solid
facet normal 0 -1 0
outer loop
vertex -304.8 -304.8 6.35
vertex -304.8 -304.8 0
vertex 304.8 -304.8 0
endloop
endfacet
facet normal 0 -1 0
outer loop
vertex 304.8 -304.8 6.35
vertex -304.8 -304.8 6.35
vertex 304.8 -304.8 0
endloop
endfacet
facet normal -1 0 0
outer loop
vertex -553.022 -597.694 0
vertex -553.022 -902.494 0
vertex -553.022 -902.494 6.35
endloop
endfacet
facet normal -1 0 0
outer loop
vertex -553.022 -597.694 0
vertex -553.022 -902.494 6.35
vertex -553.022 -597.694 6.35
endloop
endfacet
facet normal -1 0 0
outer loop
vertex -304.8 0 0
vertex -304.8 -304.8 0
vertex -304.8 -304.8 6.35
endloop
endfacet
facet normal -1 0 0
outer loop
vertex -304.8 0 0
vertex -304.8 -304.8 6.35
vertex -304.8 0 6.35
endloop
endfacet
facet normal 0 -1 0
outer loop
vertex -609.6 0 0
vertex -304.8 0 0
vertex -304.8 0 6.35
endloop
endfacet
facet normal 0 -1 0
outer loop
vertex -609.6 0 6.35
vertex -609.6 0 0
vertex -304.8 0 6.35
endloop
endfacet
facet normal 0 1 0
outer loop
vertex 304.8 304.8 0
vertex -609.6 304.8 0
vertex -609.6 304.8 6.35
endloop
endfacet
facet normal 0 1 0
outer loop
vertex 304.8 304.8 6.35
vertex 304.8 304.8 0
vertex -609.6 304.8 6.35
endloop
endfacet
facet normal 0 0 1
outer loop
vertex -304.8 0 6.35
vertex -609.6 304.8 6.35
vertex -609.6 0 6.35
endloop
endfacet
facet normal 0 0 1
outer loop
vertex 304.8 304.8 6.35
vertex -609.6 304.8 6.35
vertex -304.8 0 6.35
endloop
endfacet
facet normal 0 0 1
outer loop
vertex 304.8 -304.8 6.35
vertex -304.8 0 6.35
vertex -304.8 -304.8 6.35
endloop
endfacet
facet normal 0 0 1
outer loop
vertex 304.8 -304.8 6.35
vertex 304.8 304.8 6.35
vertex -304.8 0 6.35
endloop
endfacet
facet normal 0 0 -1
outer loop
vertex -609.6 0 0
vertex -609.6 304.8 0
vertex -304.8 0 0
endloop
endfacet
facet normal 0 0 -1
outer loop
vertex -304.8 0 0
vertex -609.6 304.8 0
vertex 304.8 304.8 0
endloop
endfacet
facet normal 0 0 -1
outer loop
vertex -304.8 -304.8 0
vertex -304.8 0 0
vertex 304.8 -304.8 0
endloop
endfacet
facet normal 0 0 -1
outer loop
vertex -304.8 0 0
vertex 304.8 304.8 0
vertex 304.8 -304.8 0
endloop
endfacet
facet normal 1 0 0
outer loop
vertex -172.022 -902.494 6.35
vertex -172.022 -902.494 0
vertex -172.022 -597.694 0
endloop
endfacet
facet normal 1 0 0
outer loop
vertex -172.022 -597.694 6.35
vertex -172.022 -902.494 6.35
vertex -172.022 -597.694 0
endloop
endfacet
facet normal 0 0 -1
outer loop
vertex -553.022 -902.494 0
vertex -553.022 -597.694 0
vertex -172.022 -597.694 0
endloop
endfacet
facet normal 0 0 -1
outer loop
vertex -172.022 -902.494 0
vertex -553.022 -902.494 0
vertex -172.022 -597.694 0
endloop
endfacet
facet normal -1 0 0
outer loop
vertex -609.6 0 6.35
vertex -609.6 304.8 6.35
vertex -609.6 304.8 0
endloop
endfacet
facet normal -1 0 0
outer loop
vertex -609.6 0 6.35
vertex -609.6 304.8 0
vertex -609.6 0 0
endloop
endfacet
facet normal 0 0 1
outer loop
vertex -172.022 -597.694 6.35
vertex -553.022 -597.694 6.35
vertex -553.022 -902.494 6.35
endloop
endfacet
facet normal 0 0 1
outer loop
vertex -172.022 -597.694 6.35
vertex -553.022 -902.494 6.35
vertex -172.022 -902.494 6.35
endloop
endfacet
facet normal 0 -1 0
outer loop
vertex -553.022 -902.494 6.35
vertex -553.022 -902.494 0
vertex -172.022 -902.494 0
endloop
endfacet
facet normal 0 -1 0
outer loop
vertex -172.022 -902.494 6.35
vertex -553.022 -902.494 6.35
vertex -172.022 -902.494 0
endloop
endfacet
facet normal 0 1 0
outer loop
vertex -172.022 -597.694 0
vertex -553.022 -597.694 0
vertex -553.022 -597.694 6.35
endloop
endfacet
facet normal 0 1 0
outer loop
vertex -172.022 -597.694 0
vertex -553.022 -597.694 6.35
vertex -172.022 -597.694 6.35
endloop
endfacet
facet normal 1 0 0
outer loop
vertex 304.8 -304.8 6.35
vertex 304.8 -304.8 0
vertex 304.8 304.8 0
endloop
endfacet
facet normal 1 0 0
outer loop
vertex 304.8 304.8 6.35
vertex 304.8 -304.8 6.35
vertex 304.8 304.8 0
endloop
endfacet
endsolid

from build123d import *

# Parameters (mm, degrees)
F0_W     = 609.6
F0_H     = 609.6
F1_DEPTH = 6.35
F2_W     = 304.8
F2_H     = 6.35
F3_DEPTH = 304.8
F4_W     = 381
F4_H     = 304.8
F5_DEPTH = 6.35


with BuildPart() as f1:
    # F0 (on Top) → F1 (new body)
    with BuildSketch(Plane.XY):
        Rectangle(F0_W, F0_H)
    extrude(amount=F1_DEPTH)

    # F2 (on face) → F3 (join)
    with BuildSketch(Plane(origin=(-304.8, 0, 0), x_dir=(0, -1, 0), z_dir=(-1, 0, 0))):
        with Locations((-152.4, 3.175)):
            Rectangle(F2_W, F2_H)
    extrude(amount=F3_DEPTH)


with BuildPart() as f5:
    # F4 (on Top) → F5 (new body)
    with BuildSketch(Plane.XY):
        with Locations((-362.522373, -750.093594)):
            Rectangle(F4_W, F4_H)
    extrude(amount=F5_DEPTH)


solid = Compound([f1.part, f5.part])
